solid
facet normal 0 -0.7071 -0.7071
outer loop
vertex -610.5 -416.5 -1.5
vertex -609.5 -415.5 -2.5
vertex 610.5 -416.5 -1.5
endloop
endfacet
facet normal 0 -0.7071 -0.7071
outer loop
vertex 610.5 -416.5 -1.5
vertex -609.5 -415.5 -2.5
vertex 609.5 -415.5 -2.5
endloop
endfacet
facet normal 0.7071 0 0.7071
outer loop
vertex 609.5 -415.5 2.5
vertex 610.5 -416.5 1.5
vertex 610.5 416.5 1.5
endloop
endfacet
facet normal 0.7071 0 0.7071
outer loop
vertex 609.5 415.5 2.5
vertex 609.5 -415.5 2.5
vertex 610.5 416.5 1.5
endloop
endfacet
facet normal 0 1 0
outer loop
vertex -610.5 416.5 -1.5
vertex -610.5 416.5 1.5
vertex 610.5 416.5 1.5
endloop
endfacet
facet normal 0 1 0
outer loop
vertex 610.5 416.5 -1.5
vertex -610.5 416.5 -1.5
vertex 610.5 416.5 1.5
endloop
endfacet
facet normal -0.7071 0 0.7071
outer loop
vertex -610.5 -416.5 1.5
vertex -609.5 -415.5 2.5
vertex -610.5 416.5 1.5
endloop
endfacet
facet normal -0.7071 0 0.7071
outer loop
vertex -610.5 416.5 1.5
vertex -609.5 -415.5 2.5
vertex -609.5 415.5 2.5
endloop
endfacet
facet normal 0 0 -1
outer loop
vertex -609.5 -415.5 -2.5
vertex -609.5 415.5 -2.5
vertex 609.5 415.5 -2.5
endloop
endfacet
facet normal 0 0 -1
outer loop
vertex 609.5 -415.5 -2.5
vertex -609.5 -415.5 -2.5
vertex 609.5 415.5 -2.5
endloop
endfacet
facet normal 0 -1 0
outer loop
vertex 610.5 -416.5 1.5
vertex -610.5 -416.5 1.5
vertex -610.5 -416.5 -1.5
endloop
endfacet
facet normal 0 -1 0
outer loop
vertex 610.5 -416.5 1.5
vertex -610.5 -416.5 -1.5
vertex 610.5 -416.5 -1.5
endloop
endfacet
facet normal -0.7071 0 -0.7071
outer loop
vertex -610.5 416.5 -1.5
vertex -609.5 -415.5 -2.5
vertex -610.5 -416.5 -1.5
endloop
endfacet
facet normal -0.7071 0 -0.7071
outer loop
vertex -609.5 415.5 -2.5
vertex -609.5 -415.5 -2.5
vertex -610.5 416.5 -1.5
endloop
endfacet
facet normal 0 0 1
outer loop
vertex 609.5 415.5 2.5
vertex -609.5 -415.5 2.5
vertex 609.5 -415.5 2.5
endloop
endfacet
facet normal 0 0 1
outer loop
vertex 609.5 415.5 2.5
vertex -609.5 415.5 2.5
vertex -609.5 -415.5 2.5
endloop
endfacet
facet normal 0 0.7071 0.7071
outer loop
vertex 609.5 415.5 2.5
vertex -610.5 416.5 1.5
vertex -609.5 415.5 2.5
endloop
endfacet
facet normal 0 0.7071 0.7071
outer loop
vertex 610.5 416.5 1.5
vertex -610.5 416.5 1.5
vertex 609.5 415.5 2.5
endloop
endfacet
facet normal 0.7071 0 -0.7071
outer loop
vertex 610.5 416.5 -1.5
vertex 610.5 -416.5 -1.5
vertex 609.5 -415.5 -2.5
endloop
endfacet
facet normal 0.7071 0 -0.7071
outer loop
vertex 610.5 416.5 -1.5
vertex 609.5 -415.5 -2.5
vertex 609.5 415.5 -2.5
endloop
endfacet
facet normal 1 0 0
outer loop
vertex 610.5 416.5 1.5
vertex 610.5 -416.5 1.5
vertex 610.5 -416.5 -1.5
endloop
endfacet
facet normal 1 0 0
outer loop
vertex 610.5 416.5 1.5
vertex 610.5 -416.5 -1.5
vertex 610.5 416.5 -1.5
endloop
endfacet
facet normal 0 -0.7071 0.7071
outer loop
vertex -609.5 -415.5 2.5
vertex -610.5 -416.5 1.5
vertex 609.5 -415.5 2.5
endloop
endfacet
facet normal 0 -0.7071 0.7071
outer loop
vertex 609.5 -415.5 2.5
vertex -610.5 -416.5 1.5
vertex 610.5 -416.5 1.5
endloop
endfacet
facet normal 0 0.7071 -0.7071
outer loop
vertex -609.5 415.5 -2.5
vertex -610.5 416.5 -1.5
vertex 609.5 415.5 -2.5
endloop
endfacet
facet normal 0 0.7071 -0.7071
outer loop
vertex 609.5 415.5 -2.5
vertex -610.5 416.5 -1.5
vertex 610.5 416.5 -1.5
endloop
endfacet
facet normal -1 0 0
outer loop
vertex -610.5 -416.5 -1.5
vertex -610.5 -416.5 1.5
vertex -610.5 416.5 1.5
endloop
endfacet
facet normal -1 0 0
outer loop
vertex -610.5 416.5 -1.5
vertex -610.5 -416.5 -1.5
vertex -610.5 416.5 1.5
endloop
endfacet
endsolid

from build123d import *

# Parameters (mm, degrees)
F0_W     = 1221
F0_H     = 833
F1_DEPTH = 2.5
F2_SIZE  = 1
F3_SIZE  = 1


with BuildPart() as f1:
    # F0 (on Top) → F1 (new body, symmetric)
    with BuildSketch(Plane.XY):
        Rectangle(F0_W, F0_H)
    extrude(amount=F1_DEPTH, both=True)

    # F2
    f2_edges = [f1.edges().sort_by_distance(p)[0] for p in [
        (0, -416.5, 2.5),
        (610.5, 0, 2.5),
        (0, 416.5, 2.5),
        (-610.5, 0, 2.5),
    ]]
    chamfer(f2_edges, length=F2_SIZE)

    # F3
    f3_edges = [f1.edges().sort_by_distance(p)[0] for p in [
        (0, 416.5, -2.5),
        (610.5, 0, -2.5),
        (0, -416.5, -2.5),
        (-610.5, 0, -2.5),
    ]]
    chamfer(f3_edges, length=F3_SIZE)


solid = f1.part
